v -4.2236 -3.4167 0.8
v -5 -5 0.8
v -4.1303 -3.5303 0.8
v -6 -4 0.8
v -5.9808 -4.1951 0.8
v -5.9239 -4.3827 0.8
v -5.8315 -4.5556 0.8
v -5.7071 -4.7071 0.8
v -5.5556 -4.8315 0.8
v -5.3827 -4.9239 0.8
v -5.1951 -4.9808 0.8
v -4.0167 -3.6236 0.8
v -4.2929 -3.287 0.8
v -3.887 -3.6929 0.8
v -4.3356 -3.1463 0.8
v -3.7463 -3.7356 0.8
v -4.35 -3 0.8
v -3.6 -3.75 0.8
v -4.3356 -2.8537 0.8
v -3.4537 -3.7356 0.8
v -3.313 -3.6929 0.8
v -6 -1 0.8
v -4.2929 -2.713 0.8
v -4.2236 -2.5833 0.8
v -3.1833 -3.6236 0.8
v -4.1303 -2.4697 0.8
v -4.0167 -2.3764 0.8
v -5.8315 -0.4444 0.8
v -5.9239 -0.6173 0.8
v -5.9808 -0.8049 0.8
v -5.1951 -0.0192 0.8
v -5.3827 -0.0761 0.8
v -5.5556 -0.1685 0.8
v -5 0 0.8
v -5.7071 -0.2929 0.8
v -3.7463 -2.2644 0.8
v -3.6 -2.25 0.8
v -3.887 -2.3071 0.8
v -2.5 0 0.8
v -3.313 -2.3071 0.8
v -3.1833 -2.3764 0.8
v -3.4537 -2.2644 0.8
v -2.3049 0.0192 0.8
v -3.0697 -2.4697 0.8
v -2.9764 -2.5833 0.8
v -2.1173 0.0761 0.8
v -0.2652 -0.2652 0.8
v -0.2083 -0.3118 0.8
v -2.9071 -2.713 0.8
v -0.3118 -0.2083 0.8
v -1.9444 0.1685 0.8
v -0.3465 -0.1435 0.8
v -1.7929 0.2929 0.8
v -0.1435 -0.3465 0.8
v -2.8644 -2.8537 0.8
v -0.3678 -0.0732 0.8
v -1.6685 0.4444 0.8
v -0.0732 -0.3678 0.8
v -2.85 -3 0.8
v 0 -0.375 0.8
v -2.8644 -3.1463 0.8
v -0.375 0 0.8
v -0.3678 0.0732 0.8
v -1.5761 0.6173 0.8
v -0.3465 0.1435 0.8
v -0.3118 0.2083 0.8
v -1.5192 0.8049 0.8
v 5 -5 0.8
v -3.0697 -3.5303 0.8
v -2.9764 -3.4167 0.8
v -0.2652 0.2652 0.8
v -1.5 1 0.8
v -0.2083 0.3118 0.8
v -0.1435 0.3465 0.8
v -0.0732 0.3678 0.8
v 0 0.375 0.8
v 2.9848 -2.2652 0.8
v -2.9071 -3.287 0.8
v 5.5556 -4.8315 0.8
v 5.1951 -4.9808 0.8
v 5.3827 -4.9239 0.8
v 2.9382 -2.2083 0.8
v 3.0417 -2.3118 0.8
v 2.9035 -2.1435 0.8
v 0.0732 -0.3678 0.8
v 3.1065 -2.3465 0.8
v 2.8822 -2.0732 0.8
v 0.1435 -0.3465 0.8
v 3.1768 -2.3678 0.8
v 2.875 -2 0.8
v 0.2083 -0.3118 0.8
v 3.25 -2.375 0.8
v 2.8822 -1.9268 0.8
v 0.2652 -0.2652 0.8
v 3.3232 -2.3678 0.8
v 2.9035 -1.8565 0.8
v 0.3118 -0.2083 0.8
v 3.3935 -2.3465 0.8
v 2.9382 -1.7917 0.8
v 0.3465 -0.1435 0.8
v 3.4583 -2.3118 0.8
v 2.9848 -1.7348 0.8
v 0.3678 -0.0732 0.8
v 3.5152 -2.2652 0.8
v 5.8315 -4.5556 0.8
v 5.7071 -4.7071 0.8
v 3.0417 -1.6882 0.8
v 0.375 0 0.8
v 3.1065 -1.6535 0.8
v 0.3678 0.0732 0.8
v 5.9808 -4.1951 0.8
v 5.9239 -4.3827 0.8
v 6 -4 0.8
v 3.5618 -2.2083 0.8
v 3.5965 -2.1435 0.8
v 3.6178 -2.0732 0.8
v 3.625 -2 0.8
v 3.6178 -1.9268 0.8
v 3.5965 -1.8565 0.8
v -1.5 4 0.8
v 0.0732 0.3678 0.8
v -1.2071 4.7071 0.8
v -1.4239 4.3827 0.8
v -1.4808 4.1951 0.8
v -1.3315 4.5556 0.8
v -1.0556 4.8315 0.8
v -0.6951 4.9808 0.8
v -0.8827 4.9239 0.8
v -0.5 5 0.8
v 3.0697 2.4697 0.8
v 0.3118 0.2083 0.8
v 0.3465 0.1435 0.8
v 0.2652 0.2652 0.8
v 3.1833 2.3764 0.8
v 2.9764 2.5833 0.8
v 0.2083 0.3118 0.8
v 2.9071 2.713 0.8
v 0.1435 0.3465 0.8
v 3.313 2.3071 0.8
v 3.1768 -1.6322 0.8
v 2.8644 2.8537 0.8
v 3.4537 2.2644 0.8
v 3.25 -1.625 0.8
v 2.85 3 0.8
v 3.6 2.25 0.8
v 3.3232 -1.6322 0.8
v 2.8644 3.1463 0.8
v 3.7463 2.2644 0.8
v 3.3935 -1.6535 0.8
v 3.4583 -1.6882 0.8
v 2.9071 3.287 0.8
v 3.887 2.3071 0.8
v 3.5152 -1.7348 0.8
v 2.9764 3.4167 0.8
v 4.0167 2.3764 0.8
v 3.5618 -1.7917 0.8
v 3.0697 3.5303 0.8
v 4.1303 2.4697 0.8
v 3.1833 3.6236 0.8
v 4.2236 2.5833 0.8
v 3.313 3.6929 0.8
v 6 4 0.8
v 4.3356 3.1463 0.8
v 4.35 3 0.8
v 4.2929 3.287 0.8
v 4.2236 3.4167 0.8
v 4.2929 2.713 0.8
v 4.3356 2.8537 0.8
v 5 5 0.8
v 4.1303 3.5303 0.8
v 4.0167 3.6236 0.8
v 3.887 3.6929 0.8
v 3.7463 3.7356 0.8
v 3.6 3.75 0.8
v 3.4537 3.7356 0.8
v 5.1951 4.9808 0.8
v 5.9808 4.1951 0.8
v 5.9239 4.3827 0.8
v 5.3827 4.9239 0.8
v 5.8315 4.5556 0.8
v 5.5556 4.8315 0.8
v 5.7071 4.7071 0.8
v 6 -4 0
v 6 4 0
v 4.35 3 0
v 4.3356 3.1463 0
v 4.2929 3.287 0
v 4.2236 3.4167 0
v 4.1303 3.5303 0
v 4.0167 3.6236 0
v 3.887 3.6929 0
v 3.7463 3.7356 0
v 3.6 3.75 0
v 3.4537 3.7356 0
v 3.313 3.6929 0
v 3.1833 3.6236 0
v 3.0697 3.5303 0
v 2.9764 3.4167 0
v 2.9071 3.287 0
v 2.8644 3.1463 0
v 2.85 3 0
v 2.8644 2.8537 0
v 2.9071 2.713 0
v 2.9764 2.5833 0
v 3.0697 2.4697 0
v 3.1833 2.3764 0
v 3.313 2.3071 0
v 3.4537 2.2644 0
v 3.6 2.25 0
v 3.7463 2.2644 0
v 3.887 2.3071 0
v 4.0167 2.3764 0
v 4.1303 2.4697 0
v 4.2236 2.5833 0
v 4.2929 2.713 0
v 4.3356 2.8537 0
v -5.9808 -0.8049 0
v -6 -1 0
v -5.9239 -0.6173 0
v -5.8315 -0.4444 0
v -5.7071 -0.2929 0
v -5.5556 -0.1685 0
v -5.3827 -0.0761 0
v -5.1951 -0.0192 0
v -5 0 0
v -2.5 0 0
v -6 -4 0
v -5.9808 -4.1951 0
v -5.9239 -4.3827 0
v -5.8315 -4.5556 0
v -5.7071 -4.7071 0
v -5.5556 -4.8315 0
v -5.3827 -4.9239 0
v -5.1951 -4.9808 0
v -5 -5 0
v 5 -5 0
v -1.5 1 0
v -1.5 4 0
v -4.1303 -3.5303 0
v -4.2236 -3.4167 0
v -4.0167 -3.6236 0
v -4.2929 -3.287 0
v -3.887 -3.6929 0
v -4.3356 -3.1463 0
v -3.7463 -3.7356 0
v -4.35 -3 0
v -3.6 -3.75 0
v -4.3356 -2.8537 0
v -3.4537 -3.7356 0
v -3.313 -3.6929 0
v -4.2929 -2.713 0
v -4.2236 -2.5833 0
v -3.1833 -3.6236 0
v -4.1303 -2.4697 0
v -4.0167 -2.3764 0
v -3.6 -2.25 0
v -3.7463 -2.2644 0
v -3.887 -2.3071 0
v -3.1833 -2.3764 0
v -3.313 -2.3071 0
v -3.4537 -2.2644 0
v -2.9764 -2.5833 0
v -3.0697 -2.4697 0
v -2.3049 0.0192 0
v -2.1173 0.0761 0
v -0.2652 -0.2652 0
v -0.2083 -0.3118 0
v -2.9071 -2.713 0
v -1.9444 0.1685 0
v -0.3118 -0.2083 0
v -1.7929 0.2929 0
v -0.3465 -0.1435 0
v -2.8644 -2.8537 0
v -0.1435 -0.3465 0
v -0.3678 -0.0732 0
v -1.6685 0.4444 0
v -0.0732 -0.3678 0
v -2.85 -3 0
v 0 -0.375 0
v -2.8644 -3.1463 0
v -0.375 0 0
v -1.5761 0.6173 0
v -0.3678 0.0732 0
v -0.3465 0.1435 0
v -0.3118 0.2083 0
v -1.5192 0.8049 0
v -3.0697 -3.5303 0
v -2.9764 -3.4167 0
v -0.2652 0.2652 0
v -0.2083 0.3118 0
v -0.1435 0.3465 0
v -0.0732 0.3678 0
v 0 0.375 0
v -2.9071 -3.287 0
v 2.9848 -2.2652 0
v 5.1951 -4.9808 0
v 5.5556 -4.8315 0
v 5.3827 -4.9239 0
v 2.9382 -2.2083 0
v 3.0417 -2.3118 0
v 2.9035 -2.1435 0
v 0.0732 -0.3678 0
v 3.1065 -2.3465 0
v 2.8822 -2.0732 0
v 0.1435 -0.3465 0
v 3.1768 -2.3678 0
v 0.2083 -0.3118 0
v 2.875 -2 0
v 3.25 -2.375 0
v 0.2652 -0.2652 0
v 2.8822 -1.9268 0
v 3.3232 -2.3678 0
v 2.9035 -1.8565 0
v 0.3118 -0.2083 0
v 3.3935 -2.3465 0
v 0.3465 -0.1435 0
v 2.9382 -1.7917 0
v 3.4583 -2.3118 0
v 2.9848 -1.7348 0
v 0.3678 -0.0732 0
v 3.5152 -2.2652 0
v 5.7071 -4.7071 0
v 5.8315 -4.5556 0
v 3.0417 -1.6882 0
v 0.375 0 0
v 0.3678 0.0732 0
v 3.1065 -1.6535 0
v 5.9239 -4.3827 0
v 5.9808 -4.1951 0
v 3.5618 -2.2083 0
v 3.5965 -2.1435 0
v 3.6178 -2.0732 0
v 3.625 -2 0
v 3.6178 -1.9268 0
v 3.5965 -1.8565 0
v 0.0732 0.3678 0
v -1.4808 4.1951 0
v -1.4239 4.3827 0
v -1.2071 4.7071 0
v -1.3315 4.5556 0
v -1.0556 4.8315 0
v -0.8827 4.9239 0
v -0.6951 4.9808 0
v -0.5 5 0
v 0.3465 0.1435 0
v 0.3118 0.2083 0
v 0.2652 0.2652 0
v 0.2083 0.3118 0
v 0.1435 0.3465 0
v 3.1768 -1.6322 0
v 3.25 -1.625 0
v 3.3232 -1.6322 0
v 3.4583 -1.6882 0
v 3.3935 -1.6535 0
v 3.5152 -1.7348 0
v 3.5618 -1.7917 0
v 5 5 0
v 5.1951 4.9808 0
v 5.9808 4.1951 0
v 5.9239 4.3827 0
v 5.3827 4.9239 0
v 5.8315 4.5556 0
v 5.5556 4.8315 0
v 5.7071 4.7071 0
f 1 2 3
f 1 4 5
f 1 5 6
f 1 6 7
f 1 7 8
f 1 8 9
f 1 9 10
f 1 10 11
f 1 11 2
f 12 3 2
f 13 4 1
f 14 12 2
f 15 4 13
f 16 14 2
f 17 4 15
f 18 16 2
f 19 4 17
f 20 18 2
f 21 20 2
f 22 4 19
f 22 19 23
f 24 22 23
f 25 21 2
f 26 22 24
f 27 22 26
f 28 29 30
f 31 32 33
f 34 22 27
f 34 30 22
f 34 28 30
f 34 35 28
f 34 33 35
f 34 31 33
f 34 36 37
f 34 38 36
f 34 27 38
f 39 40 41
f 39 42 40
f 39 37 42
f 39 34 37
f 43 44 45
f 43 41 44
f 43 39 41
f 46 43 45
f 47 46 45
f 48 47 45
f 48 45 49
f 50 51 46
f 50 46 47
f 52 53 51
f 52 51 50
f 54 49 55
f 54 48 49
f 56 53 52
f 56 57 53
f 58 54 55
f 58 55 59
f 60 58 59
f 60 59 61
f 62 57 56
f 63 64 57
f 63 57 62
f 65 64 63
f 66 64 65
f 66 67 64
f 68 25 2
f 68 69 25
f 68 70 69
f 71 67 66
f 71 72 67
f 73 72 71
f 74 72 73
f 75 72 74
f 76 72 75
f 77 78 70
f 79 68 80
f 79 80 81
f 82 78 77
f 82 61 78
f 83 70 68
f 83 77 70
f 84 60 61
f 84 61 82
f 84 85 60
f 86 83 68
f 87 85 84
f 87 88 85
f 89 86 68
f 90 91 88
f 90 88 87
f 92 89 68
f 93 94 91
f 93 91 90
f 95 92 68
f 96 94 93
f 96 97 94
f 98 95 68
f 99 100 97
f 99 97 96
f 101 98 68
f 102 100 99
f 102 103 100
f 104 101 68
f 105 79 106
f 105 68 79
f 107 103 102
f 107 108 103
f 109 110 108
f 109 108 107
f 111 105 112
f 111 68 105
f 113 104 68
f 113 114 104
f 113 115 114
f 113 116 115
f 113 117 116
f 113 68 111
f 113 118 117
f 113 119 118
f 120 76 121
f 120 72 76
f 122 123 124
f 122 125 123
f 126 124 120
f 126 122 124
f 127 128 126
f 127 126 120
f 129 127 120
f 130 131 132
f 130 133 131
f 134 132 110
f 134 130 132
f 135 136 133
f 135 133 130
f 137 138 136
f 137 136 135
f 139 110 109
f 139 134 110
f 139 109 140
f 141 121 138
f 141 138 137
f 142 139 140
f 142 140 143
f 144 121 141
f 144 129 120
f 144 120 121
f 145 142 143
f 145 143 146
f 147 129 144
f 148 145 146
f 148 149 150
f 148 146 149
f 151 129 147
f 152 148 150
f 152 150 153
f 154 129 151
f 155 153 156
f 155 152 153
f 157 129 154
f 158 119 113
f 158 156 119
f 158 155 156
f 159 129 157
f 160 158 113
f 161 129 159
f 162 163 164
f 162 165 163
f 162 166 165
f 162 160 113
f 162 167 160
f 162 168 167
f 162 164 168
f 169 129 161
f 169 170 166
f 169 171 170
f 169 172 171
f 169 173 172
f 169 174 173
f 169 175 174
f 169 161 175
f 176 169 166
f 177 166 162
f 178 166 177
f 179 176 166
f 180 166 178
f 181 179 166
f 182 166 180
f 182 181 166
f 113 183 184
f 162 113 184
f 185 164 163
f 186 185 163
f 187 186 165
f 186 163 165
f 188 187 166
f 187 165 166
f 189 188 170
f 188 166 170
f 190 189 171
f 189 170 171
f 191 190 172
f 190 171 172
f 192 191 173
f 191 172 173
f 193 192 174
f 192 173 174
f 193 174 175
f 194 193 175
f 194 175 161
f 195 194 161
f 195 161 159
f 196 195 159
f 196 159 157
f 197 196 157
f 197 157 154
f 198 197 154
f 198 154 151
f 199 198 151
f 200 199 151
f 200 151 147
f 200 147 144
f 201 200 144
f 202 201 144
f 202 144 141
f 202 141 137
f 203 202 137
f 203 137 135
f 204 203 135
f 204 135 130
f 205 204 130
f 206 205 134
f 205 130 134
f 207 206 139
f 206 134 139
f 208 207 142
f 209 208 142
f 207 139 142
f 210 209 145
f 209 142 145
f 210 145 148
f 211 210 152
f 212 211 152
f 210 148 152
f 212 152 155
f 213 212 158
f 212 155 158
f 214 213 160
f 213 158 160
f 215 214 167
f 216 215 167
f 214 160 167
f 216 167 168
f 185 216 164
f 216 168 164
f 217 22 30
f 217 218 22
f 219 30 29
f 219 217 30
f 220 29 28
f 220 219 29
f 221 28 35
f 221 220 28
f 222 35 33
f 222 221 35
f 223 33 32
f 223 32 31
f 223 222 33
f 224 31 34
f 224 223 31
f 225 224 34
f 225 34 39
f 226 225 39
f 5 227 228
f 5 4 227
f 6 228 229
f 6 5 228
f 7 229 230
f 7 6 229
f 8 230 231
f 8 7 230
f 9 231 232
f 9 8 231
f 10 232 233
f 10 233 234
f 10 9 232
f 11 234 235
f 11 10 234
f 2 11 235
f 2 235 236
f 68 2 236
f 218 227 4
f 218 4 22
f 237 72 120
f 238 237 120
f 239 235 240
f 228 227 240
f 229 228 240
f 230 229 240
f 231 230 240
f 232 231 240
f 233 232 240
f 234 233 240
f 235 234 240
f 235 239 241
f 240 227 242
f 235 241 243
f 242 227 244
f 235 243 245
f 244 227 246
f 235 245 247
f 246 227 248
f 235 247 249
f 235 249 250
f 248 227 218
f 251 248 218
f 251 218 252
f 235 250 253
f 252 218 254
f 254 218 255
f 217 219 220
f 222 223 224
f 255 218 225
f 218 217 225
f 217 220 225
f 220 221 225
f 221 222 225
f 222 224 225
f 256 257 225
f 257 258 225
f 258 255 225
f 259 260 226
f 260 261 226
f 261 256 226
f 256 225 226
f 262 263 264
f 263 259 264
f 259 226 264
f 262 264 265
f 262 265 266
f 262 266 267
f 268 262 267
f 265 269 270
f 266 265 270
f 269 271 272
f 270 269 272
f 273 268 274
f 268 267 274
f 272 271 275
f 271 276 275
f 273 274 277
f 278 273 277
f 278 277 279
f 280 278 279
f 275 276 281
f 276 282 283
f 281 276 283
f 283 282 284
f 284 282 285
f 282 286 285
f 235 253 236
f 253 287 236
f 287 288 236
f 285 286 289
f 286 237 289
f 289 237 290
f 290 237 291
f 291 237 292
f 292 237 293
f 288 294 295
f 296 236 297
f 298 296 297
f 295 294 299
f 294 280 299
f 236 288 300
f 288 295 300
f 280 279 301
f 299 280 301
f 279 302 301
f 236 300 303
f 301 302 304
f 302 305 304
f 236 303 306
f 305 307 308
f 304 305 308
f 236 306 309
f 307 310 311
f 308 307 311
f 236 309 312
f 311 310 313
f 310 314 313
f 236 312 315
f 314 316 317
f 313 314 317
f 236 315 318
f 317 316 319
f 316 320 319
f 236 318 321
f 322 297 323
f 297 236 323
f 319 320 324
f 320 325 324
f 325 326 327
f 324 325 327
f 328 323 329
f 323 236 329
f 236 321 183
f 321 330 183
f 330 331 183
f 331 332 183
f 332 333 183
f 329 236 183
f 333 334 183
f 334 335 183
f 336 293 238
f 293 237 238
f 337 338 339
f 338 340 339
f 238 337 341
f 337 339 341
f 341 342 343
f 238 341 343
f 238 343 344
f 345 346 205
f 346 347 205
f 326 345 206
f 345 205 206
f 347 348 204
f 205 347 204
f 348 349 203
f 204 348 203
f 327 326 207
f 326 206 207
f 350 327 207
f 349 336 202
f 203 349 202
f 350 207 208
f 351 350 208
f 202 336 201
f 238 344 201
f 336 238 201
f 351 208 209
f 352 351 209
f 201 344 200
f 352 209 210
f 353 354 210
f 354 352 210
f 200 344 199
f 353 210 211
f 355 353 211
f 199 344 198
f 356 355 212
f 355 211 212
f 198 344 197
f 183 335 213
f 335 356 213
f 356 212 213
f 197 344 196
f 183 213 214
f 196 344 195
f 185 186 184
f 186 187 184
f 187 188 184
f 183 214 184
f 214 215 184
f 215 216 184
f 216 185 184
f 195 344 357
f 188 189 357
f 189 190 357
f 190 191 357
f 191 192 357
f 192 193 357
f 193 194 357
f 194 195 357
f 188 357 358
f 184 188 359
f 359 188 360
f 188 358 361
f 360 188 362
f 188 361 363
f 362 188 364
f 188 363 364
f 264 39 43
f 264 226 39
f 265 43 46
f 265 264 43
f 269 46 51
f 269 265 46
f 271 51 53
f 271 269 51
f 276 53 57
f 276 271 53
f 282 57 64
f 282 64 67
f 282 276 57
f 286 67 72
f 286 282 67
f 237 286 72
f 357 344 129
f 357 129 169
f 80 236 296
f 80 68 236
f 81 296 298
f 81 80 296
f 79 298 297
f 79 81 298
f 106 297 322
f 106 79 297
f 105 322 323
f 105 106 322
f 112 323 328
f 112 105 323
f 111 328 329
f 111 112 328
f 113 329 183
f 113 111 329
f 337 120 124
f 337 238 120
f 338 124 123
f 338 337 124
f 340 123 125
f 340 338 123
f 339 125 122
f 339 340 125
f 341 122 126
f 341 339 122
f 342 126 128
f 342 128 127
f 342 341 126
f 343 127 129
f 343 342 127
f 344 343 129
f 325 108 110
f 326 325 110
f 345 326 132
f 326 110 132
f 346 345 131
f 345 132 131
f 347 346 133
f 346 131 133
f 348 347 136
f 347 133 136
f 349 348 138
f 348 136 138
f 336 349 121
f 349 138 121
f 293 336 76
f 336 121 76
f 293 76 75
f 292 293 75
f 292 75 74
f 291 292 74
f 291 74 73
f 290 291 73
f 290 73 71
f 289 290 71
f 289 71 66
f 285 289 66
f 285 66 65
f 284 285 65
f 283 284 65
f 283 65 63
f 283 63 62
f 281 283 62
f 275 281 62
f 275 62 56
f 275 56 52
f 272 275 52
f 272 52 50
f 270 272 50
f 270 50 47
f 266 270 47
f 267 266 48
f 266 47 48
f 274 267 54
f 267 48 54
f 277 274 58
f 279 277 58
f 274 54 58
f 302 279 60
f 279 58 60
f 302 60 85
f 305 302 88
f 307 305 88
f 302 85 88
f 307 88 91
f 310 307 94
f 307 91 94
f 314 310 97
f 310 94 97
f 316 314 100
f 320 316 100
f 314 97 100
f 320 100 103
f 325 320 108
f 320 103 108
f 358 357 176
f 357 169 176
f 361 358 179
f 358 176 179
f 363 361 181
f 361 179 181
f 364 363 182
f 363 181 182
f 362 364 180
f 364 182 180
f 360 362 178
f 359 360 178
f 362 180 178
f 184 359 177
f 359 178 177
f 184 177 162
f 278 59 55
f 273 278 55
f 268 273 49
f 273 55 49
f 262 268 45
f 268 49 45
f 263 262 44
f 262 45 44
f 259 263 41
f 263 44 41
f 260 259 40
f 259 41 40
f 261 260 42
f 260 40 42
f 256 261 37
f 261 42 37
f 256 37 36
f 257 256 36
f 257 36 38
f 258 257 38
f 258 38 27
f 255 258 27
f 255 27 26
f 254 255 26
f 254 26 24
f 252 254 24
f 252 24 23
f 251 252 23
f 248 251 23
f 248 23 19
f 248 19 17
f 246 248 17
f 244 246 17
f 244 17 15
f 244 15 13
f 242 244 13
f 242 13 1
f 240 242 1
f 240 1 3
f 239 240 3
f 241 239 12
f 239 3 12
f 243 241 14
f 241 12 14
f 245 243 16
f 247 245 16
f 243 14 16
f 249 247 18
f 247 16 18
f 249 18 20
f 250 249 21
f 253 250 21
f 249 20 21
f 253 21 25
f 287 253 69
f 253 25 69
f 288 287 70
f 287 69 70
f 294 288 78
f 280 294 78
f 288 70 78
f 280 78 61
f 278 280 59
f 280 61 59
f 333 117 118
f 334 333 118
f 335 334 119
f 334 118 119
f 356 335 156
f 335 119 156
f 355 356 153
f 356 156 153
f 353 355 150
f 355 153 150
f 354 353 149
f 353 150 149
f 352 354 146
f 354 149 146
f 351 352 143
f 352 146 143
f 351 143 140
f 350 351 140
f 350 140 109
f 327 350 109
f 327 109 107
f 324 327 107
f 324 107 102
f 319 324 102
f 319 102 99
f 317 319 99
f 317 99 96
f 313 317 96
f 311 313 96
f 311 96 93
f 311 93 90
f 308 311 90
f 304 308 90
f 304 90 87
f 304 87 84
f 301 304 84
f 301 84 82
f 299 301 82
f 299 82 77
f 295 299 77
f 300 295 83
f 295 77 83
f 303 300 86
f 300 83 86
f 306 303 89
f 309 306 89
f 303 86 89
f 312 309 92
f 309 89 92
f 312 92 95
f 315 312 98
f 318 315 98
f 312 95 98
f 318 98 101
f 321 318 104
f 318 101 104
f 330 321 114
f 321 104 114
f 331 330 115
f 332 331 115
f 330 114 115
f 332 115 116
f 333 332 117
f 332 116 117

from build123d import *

# Parameters (mm, degrees)
SKETCH_1_W          = 12
SKETCH_1_H          = 10
EXTRUDE_1_DEPTH     = 0.8
CUT_EXTRUDE_1_REACH = 9.851
SKETCH_2_R          = 0.375
SKETCH_2_R_2        = 0.75
SKETCH_2_W          = 4.5
SKETCH_2_H          = 5
FILLET_1_R          = 1


with BuildPart() as part:
    # Эскиз1 → Бобышка-Вытянуть1 (new body)
    with BuildSketch(Plane.XY):
        Rectangle(SKETCH_1_W, SKETCH_1_H)
    extrude(amount=EXTRUDE_1_DEPTH)

    # Эскиз2 → Вырез-Вытянуть1 (cut, up to next)
    with BuildSketch(Plane.XY.offset(0.8), mode=Mode.PRIVATE) as cut_extrude_1_sk1:
        Circle(SKETCH_2_R)
    cut_extrude_1_tool1 = extrude(cut_extrude_1_sk1.sketch, amount=-CUT_EXTRUDE_1_REACH, mode=Mode.PRIVATE) & part.part
    # Эскиз2 → Вырез-Вытянуть1 (cut, up to next)
    with BuildSketch(Plane.XY.offset(0.8), mode=Mode.PRIVATE) as cut_extrude_1_sk2:
        with Locations((-3.6, -3)):
            Circle(SKETCH_2_R_2)
    cut_extrude_1_tool2 = extrude(cut_extrude_1_sk2.sketch, amount=-CUT_EXTRUDE_1_REACH, mode=Mode.PRIVATE) & part.part
    # Эскиз2 → Вырез-Вытянуть1 (cut, up to next)
    with BuildSketch(Plane.XY.offset(0.8), mode=Mode.PRIVATE) as cut_extrude_1_sk3:
        with Locations((3.6, 3)):
            Circle(SKETCH_2_R_2)
    cut_extrude_1_tool3 = extrude(cut_extrude_1_sk3.sketch, amount=-CUT_EXTRUDE_1_REACH, mode=Mode.PRIVATE) & part.part
    # Эскиз2 → Вырез-Вытянуть1 (cut, up to next)
    with BuildSketch(Plane.XY.offset(0.8), mode=Mode.PRIVATE) as cut_extrude_1_sk4:
        with Locations((3.25, -2)):
            Circle(SKETCH_2_R)
    cut_extrude_1_tool4 = extrude(cut_extrude_1_sk4.sketch, amount=-CUT_EXTRUDE_1_REACH, mode=Mode.PRIVATE) & part.part
    # Эскиз2 → Вырез-Вытянуть1 (cut, up to next)
    with BuildSketch(Plane.XY.offset(0.8), mode=Mode.PRIVATE) as cut_extrude_1_sk5:
        with Locations((-3.75, 2.5)):
            Rectangle(SKETCH_2_W, SKETCH_2_H)
    cut_extrude_1_tool5 = extrude(cut_extrude_1_sk5.sketch, amount=-CUT_EXTRUDE_1_REACH, mode=Mode.PRIVATE) & part.part
    add(cut_extrude_1_tool1.solids().sort_by_distance((0, 0, 0.8))[0], mode=Mode.SUBTRACT)
    add(cut_extrude_1_tool2.solids().sort_by_distance((-3.6, -3, 0.8))[0], mode=Mode.SUBTRACT)
    add(cut_extrude_1_tool3.solids().sort_by_distance((3.6, 3, 0.8))[0], mode=Mode.SUBTRACT)
    add(cut_extrude_1_tool4.solids().sort_by_distance((3.25, -2, 0.8))[0], mode=Mode.SUBTRACT)
    add(cut_extrude_1_tool5.solids().sort_by_distance((-3.75, 2.5, 0.8))[0], mode=Mode.SUBTRACT)

    # Скругление1
    fillet_1_edges = [part.edges().sort_by_distance(p)[0] for p in [
        (-6, 0, 0.4),
        (-1.5, 5, 0.4),
        (-1.5, 0, 0.4),
        (6, -5, 0.4),
        (-6, -5, 0.4),
        (6, 5, 0.4),
    ]]
    fillet(fillet_1_edges, radius=FILLET_1_R)


solid = part.part
